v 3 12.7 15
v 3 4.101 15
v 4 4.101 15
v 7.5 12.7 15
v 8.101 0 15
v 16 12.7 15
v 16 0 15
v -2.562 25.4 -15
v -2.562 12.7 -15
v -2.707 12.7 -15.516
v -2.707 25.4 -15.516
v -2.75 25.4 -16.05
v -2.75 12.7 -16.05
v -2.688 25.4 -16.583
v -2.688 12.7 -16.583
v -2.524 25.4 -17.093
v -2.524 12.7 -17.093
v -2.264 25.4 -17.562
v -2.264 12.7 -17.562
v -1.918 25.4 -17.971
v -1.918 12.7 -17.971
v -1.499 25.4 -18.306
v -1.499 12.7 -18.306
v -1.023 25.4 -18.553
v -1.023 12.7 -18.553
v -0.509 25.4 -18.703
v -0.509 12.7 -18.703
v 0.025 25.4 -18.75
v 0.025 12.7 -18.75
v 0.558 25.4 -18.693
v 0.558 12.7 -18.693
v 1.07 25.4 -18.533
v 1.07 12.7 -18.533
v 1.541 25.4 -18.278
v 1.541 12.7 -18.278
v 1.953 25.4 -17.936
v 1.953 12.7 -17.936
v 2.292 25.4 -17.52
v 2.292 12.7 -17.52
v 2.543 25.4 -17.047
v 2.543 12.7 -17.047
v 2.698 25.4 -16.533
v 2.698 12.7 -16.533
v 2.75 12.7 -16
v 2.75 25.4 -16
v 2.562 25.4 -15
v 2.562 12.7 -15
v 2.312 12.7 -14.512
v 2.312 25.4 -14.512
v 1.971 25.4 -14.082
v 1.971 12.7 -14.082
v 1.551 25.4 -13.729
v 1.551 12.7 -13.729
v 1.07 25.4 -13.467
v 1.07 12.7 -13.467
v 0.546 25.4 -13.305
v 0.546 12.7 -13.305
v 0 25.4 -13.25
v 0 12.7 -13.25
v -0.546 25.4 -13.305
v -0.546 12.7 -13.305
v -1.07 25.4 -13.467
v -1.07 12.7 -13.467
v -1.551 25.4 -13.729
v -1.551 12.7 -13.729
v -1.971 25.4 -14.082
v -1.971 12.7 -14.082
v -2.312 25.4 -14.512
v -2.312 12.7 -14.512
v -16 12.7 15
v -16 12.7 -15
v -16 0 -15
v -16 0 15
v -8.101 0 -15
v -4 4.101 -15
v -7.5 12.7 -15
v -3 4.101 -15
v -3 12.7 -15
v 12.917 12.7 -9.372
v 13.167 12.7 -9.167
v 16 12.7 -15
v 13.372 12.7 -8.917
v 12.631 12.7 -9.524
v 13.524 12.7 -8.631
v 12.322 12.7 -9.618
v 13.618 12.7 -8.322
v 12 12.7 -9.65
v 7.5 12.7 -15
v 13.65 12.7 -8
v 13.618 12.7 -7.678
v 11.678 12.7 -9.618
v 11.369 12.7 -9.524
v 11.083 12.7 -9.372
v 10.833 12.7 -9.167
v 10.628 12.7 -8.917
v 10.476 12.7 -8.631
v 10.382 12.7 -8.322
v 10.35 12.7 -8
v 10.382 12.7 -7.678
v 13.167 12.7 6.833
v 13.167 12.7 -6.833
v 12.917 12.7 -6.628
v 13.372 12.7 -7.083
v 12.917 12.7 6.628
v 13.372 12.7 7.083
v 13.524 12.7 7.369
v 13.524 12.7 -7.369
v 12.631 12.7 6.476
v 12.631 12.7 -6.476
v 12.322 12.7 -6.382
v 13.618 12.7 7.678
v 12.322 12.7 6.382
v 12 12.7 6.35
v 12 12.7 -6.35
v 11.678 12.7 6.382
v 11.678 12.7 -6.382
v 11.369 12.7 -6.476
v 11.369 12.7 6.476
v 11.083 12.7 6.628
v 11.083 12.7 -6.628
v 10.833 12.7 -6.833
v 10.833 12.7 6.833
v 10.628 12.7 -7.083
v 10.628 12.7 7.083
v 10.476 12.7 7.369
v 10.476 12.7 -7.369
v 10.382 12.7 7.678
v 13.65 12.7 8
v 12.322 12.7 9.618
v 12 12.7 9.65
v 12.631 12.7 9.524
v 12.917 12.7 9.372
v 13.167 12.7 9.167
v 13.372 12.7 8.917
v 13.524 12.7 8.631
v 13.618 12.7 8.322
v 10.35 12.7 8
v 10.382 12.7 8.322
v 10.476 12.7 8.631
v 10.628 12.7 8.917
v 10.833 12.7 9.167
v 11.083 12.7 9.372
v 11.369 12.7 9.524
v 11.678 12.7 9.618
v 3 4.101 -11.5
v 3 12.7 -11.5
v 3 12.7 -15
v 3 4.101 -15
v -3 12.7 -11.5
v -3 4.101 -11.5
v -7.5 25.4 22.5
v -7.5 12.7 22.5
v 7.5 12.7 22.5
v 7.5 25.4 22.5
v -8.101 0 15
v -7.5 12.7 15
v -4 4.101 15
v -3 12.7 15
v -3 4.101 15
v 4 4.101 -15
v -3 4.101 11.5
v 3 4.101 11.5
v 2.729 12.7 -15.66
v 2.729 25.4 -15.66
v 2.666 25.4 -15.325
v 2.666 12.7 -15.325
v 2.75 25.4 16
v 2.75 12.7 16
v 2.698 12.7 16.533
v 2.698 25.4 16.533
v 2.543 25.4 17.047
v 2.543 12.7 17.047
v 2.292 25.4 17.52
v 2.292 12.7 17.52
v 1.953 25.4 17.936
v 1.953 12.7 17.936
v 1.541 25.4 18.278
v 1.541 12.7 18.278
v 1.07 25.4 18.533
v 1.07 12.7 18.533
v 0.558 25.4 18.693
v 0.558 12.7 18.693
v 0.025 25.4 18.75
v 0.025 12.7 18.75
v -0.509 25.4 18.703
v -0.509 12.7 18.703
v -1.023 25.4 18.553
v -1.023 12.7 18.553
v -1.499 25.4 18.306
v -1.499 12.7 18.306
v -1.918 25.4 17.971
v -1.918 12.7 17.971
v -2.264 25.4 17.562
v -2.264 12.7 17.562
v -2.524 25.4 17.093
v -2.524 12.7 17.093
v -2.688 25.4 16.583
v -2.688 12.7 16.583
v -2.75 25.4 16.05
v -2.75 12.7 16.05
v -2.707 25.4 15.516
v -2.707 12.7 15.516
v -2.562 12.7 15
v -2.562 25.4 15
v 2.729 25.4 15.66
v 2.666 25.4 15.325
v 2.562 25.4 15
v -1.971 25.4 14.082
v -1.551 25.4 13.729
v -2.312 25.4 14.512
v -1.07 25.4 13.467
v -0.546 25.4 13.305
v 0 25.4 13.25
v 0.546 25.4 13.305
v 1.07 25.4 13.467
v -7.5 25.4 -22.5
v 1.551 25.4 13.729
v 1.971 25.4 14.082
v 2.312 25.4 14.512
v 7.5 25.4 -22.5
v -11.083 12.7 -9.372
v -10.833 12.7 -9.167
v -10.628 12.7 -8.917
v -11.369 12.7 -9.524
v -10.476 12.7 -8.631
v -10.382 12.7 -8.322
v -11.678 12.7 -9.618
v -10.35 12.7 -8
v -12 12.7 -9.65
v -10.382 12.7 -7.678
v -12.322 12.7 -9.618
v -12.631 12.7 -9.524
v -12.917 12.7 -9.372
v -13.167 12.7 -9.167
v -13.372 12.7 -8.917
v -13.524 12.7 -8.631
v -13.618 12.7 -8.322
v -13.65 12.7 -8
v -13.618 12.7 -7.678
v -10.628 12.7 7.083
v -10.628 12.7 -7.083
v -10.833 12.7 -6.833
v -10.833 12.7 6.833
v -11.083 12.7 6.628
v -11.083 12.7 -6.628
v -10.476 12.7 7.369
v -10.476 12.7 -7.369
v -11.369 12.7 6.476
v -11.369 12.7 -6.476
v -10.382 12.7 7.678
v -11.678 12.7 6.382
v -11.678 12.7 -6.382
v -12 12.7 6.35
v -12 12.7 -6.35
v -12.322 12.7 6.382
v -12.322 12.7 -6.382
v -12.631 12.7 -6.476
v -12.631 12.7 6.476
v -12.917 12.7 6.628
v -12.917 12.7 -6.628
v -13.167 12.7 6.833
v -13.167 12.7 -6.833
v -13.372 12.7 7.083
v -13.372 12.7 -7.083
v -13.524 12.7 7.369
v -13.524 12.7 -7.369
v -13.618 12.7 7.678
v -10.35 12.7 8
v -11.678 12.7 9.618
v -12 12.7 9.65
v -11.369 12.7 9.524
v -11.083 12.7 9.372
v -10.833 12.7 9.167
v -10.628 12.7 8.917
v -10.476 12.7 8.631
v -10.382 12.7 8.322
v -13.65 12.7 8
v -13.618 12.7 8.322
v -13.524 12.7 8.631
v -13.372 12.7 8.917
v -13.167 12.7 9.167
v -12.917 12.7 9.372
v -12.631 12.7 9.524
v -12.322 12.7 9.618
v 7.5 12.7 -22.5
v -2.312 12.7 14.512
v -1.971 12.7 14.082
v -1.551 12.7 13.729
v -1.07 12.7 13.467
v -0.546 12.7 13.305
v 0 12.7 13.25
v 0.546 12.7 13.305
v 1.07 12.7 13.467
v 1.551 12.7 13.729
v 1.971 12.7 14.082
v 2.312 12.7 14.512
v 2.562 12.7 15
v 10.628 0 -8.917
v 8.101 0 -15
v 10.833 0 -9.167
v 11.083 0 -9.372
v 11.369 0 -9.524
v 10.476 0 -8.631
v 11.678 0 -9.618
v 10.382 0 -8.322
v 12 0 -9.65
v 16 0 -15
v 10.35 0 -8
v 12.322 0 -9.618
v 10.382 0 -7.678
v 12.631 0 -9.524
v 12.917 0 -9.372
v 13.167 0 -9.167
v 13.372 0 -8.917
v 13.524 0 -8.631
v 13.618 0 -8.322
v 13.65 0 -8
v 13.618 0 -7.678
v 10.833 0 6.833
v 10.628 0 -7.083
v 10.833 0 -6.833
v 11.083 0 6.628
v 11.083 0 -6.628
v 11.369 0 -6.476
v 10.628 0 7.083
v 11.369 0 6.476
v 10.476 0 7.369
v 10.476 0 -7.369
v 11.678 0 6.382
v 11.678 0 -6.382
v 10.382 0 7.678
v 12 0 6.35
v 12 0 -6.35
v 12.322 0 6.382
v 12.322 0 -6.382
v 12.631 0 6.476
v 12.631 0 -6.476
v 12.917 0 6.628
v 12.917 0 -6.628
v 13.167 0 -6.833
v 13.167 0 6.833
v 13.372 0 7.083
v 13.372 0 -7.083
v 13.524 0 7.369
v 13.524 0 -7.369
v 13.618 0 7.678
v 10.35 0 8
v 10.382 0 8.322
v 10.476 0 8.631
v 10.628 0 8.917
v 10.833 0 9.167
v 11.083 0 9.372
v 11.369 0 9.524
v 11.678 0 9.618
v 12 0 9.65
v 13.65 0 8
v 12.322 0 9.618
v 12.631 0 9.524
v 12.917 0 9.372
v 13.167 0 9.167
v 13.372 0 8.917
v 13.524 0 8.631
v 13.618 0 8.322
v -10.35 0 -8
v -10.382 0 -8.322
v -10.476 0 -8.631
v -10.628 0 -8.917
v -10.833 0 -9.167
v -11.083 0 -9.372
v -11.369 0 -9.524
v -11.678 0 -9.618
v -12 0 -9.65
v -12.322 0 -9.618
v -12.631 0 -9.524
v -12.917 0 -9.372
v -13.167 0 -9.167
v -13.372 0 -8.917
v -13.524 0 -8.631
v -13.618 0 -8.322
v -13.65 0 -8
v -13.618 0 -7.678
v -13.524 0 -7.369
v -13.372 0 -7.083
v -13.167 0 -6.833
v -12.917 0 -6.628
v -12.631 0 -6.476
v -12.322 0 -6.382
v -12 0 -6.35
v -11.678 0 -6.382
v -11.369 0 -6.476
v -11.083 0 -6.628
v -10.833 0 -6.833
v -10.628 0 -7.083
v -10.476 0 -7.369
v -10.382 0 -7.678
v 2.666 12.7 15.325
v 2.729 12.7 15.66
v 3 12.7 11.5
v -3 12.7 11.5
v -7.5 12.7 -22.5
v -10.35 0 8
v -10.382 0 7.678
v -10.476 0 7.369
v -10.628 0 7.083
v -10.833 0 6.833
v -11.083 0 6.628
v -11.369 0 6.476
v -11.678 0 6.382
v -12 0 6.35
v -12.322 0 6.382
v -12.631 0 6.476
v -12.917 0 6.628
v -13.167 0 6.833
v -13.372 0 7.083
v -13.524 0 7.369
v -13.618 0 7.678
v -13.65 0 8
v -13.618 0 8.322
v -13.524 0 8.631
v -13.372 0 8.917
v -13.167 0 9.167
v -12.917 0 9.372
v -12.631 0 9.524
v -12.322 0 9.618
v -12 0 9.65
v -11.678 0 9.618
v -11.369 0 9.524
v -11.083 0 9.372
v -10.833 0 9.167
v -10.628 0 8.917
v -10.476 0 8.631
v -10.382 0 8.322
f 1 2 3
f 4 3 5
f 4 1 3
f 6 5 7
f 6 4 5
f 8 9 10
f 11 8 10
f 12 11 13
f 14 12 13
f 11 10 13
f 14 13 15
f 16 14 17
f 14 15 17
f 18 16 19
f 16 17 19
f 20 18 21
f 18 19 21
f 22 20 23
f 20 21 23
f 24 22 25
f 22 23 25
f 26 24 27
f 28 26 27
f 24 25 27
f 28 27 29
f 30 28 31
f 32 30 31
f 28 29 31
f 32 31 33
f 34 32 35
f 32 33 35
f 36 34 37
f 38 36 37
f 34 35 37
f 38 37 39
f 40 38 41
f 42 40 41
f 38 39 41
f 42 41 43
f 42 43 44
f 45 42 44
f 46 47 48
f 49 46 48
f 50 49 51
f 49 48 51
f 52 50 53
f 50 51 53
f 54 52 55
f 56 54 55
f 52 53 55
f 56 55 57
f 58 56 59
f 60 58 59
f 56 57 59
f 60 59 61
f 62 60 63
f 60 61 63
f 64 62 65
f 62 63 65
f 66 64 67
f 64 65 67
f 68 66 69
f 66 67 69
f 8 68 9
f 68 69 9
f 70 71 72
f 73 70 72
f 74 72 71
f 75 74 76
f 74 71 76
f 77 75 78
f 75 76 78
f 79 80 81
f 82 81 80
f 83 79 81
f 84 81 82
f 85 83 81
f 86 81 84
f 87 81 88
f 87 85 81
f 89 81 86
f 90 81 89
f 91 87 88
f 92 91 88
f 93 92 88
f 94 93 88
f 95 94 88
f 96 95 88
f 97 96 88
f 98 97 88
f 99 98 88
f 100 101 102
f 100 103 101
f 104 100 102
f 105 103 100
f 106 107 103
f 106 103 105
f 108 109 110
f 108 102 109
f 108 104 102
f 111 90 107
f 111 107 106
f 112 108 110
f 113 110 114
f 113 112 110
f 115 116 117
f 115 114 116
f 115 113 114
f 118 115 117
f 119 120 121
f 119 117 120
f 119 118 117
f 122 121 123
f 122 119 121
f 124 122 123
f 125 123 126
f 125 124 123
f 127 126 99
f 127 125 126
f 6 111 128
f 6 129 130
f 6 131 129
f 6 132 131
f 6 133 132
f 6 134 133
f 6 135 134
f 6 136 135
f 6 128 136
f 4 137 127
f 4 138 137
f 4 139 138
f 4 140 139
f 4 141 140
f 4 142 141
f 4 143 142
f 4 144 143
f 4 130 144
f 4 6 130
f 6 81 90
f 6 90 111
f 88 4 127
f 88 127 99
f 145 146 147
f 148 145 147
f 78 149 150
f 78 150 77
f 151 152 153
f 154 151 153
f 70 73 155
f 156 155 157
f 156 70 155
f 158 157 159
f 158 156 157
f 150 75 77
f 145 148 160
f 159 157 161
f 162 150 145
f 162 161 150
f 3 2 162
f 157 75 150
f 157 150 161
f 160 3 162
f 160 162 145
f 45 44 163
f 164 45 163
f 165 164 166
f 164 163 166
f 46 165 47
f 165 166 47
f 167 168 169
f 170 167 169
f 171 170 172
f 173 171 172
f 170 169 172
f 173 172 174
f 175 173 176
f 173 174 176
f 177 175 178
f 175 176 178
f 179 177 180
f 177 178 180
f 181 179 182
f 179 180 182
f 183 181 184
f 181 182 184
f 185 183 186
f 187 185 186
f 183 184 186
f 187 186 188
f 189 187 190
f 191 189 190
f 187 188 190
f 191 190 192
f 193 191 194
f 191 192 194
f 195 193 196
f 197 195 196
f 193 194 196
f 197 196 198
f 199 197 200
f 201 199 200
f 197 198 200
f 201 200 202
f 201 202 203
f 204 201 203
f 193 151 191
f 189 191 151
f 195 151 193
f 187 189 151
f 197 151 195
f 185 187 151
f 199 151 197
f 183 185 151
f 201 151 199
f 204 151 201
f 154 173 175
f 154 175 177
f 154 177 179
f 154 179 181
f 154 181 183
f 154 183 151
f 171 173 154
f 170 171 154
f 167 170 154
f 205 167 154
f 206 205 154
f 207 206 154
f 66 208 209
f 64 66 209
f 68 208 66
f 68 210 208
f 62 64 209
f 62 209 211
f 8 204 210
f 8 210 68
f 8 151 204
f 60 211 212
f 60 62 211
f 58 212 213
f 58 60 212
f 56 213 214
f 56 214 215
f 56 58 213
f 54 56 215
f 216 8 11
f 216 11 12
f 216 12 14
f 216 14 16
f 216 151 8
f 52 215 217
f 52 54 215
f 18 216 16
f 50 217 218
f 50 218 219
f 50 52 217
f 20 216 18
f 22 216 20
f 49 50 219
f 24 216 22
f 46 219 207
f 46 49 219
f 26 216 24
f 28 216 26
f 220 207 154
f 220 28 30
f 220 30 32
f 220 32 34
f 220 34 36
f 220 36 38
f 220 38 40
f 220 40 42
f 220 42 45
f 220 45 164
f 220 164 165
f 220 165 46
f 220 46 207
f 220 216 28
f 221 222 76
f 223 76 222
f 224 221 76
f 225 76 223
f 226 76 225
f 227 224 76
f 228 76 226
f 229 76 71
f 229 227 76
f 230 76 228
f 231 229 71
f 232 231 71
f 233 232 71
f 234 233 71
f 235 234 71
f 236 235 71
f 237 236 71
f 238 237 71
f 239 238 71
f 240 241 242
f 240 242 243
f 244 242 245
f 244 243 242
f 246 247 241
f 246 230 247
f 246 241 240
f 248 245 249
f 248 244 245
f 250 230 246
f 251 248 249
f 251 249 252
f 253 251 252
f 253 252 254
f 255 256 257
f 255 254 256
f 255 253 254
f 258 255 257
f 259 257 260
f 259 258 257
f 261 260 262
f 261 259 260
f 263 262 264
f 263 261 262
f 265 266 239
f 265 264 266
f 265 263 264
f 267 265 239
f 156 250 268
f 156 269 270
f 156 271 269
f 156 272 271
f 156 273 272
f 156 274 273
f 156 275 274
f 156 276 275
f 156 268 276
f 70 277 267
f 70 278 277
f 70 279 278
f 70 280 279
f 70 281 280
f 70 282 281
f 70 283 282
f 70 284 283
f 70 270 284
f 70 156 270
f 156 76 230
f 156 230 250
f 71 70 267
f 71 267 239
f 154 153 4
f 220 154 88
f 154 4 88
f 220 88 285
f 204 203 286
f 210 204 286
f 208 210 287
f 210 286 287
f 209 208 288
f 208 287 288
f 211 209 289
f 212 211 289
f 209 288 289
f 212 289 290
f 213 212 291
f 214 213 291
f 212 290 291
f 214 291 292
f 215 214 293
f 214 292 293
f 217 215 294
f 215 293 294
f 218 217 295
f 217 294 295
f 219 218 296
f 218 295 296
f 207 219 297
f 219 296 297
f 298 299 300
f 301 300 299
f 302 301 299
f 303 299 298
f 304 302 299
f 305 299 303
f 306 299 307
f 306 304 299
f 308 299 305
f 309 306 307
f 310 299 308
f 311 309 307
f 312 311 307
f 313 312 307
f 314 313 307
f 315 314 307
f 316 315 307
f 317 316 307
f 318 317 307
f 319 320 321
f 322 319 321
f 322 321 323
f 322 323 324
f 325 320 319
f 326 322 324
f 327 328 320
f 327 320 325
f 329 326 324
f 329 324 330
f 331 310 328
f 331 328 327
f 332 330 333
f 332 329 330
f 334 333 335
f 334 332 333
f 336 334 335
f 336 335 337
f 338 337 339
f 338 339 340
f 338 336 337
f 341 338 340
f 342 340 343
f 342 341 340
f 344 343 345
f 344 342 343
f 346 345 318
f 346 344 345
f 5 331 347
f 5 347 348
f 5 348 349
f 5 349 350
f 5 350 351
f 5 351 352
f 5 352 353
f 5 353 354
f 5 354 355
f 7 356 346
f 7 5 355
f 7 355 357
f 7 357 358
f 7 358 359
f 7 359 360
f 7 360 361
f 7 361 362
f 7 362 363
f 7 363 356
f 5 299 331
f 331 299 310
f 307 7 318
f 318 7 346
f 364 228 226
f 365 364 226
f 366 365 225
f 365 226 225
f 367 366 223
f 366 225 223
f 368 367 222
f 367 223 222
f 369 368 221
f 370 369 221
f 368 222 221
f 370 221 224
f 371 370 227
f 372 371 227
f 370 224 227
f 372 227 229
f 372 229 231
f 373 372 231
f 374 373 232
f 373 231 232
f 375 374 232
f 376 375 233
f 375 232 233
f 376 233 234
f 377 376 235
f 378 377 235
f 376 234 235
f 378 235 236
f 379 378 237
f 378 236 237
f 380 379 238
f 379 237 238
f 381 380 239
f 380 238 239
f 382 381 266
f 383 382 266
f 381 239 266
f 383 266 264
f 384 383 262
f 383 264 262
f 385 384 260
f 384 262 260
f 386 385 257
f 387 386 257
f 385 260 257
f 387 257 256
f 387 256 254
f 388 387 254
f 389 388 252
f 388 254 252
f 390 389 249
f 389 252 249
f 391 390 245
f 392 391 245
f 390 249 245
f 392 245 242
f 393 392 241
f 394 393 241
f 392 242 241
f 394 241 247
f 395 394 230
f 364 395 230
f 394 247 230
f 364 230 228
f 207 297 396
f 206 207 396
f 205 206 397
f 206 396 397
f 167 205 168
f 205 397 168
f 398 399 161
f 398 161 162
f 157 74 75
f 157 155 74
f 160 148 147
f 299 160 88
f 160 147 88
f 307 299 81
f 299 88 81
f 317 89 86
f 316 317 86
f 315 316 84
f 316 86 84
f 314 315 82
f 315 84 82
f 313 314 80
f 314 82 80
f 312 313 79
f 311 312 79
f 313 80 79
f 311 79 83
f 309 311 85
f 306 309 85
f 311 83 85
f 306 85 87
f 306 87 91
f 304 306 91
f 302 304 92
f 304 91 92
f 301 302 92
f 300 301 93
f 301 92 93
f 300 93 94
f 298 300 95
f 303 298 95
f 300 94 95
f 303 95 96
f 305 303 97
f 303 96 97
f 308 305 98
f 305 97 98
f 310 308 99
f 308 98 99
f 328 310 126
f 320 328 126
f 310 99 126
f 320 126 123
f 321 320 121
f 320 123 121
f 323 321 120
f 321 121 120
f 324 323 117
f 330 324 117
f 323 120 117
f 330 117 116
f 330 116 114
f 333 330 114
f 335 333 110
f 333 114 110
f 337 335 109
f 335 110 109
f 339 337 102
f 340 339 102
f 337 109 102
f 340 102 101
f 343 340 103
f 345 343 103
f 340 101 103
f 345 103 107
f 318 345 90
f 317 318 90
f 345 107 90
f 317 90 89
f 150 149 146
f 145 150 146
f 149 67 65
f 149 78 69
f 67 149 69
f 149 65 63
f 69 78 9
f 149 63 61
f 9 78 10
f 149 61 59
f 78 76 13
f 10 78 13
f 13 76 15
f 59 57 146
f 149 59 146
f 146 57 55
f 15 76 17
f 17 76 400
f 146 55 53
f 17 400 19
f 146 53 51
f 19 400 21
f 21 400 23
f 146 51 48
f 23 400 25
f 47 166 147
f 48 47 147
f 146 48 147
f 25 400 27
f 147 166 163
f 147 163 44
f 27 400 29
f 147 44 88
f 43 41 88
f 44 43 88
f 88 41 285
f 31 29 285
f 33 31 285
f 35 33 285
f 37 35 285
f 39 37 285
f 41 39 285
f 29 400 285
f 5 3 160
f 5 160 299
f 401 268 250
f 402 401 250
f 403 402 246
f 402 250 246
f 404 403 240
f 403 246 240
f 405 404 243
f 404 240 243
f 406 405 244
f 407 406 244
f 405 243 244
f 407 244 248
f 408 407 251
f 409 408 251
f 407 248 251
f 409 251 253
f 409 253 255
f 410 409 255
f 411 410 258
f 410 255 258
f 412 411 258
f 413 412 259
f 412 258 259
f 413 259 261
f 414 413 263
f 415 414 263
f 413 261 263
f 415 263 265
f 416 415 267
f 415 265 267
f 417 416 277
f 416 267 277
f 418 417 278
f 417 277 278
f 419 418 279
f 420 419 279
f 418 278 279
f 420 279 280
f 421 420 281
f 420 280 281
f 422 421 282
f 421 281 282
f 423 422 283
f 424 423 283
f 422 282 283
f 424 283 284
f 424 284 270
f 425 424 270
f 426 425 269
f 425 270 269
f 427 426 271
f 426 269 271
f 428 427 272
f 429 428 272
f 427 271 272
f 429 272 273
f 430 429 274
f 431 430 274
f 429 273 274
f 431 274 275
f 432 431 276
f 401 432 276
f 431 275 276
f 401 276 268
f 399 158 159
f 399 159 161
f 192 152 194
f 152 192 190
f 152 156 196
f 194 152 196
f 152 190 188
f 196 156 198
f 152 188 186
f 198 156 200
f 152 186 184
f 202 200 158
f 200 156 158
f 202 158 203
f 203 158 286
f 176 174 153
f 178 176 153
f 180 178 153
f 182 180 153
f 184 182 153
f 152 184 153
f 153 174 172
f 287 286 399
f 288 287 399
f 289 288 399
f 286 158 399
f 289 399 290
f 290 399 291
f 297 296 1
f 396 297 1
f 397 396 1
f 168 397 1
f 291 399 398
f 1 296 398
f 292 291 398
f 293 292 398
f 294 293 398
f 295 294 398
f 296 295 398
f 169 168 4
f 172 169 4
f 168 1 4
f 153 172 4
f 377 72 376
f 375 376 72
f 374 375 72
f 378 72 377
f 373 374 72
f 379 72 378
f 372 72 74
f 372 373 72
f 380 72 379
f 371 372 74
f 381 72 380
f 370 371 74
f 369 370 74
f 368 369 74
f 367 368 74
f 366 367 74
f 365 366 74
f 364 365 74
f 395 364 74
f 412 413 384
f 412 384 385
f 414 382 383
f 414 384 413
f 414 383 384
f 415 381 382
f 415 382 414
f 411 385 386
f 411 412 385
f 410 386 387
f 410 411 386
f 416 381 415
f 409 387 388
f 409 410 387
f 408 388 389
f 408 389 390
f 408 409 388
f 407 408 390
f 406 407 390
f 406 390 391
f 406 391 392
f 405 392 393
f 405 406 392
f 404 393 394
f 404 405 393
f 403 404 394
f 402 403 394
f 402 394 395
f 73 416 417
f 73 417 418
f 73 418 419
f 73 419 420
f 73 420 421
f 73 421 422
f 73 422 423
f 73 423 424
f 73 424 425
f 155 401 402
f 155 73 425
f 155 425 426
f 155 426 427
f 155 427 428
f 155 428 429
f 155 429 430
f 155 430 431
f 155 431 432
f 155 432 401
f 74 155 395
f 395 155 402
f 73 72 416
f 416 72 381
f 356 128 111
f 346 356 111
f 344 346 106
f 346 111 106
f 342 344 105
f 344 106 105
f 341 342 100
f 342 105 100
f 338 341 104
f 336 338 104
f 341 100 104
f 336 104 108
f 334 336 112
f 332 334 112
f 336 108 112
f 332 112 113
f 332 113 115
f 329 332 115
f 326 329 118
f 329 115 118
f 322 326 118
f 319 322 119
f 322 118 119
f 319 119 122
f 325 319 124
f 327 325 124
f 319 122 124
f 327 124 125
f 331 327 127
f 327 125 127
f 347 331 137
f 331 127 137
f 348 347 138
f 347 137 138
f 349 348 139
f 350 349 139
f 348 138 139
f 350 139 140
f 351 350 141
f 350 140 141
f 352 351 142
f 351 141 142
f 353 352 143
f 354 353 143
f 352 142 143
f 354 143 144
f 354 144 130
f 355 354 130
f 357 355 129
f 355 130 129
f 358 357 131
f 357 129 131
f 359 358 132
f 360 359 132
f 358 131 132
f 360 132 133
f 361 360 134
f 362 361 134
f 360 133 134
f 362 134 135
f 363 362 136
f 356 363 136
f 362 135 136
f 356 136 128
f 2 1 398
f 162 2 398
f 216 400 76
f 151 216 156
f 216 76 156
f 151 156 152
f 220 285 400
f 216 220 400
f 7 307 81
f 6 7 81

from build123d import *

# Parameters (mm, degrees)
BOSS_EXTRUDE1_DEPTH = 15
SKETCH2_R           = 1.65
CUT_EXTRUDE1_DEPTH  = 12.7
SKETCH3_W           = 4.5
SKETCH3_H           = 7.5
BOSS_EXTRUDE3_DEPTH = 12.7
SKETCH3_7_W         = 6
SKETCH3_7_H         = 3.5
CUT_EXTRUDE4_DEPTH  = 12.7


with BuildPart() as part:
    # Sketch1 → Boss-Extrude1 (new body, symmetric)
    with BuildSketch(Plane.XY):
        Polygon((-4, 4.101219331), (4, 4.101219331), (8.101219331, 0), (16, 0), (16, 12.7), (-16, 12.7), (-16, 0), (-8.101219331, 0), align=None)
    extrude(amount=BOSS_EXTRUDE1_DEPTH, both=True)

    # Sketch2 → Cut-Extrude1 (cut)
    with BuildSketch(Plane(origin=(0, 12.7, 0), x_dir=(1, 0, 0), z_dir=(0, 1, 0))):
        with Locations((12, 8)):
            Circle(SKETCH2_R)
        with Locations((12, -8)):
            Circle(SKETCH2_R)
        with Locations((-12, -8)):
            Circle(SKETCH2_R)
        with Locations((-12, 8)):
            Circle(SKETCH2_R)
    extrude(amount=-CUT_EXTRUDE1_DEPTH, mode=Mode.SUBTRACT)

    # Sketch3 → Boss-Extrude3 (add)
    with BuildSketch(Plane(origin=(0, 12.7, 0), x_dir=(1, 0, 0), z_dir=(0, 1, 0))):
        with Locations((5.25, 18.75)):
            Rectangle(SKETCH3_W, SKETCH3_H)
        Polygon((3, -15), (7.5, -15), (7.5, 15), (3, 15), (3, 11.5), (-3, 11.5), (-3, 15), (-7.5, 15), (-7.5, -15), (-3, -15), (-3, -11.5), (3, -11.5), align=None)
        with Locations((-5.25, 18.75)):
            Rectangle(SKETCH3_W, SKETCH3_H)
        with BuildLine():
            Line((2.561737691, 15), (3, 15))
            Line((3, 15), (3, 22.5))
            Line((3, 22.5), (-3, 22.5))
            Line((-3, 22.5), (-3, 15))
            Line((-3, 15), (-2.561737691, 15))
            ThreePointArc((-2.561737691, 15), (-0.508783524, 18.702524621), (2.75, 16))
            ThreePointArc((2.75, 16), (2.702524621, 15.491216476), (2.561737691, 15))
        make_face()
        with BuildLine():
            Line((3, 11.5), (3, 15))
            Line((3, 15), (2.561737691, 15))
            ThreePointArc((2.561737691, 15), (0, 13.25), (-2.561737691, 15))
            Line((-2.561737691, 15), (-3, 15))
            Line((-3, 15), (-3, 11.5))
            Line((-3, 11.5), (3, 11.5))
        make_face()
        with BuildLine():
            Line((-3, -22.5), (3, -22.5))
            Line((3, -22.5), (3, -15))
            Line((3, -15), (2.561737691, -15))
            ThreePointArc((2.561737691, -15), (2.702524621, -15.491216476), (2.75, -16))
            ThreePointArc((2.75, -16), (-0.508783524, -18.702524621), (-2.561737691, -15))
            Line((-2.561737691, -15), (-3, -15))
            Line((-3, -15), (-3, -22.5))
        make_face()
        with Locations((5.25, -18.75)):
            Rectangle(SKETCH3_W, SKETCH3_H)
        with Locations((-5.25, -18.75)):
            Rectangle(SKETCH3_W, SKETCH3_H)
        with BuildLine():
            Line((2.561737691, -15), (3, -15))
            Line((3, -15), (3, -11.5))
            Line((3, -11.5), (-3, -11.5))
            Line((-3, -11.5), (-3, -15))
            Line((-3, -15), (-2.561737691, -15))
            ThreePointArc((-2.561737691, -15), (0, -13.25), (2.561737691, -15))
        make_face()
    extrude(amount=BOSS_EXTRUDE3_DEPTH)

    # Sketch3<7> → Cut-Extrude4 (cut)
    with BuildSketch(Plane(origin=(0, 12.7, 0), x_dir=(1, 0, 0), z_dir=(0, 1, 0))):
        with Locations((0, -13.25)):
            Rectangle(SKETCH3_7_W, SKETCH3_7_H)
        with Locations((0, 13.25)):
            Rectangle(SKETCH3_7_W, SKETCH3_7_H)
    extrude(amount=-CUT_EXTRUDE4_DEPTH, mode=Mode.SUBTRACT)


solid = part.part
